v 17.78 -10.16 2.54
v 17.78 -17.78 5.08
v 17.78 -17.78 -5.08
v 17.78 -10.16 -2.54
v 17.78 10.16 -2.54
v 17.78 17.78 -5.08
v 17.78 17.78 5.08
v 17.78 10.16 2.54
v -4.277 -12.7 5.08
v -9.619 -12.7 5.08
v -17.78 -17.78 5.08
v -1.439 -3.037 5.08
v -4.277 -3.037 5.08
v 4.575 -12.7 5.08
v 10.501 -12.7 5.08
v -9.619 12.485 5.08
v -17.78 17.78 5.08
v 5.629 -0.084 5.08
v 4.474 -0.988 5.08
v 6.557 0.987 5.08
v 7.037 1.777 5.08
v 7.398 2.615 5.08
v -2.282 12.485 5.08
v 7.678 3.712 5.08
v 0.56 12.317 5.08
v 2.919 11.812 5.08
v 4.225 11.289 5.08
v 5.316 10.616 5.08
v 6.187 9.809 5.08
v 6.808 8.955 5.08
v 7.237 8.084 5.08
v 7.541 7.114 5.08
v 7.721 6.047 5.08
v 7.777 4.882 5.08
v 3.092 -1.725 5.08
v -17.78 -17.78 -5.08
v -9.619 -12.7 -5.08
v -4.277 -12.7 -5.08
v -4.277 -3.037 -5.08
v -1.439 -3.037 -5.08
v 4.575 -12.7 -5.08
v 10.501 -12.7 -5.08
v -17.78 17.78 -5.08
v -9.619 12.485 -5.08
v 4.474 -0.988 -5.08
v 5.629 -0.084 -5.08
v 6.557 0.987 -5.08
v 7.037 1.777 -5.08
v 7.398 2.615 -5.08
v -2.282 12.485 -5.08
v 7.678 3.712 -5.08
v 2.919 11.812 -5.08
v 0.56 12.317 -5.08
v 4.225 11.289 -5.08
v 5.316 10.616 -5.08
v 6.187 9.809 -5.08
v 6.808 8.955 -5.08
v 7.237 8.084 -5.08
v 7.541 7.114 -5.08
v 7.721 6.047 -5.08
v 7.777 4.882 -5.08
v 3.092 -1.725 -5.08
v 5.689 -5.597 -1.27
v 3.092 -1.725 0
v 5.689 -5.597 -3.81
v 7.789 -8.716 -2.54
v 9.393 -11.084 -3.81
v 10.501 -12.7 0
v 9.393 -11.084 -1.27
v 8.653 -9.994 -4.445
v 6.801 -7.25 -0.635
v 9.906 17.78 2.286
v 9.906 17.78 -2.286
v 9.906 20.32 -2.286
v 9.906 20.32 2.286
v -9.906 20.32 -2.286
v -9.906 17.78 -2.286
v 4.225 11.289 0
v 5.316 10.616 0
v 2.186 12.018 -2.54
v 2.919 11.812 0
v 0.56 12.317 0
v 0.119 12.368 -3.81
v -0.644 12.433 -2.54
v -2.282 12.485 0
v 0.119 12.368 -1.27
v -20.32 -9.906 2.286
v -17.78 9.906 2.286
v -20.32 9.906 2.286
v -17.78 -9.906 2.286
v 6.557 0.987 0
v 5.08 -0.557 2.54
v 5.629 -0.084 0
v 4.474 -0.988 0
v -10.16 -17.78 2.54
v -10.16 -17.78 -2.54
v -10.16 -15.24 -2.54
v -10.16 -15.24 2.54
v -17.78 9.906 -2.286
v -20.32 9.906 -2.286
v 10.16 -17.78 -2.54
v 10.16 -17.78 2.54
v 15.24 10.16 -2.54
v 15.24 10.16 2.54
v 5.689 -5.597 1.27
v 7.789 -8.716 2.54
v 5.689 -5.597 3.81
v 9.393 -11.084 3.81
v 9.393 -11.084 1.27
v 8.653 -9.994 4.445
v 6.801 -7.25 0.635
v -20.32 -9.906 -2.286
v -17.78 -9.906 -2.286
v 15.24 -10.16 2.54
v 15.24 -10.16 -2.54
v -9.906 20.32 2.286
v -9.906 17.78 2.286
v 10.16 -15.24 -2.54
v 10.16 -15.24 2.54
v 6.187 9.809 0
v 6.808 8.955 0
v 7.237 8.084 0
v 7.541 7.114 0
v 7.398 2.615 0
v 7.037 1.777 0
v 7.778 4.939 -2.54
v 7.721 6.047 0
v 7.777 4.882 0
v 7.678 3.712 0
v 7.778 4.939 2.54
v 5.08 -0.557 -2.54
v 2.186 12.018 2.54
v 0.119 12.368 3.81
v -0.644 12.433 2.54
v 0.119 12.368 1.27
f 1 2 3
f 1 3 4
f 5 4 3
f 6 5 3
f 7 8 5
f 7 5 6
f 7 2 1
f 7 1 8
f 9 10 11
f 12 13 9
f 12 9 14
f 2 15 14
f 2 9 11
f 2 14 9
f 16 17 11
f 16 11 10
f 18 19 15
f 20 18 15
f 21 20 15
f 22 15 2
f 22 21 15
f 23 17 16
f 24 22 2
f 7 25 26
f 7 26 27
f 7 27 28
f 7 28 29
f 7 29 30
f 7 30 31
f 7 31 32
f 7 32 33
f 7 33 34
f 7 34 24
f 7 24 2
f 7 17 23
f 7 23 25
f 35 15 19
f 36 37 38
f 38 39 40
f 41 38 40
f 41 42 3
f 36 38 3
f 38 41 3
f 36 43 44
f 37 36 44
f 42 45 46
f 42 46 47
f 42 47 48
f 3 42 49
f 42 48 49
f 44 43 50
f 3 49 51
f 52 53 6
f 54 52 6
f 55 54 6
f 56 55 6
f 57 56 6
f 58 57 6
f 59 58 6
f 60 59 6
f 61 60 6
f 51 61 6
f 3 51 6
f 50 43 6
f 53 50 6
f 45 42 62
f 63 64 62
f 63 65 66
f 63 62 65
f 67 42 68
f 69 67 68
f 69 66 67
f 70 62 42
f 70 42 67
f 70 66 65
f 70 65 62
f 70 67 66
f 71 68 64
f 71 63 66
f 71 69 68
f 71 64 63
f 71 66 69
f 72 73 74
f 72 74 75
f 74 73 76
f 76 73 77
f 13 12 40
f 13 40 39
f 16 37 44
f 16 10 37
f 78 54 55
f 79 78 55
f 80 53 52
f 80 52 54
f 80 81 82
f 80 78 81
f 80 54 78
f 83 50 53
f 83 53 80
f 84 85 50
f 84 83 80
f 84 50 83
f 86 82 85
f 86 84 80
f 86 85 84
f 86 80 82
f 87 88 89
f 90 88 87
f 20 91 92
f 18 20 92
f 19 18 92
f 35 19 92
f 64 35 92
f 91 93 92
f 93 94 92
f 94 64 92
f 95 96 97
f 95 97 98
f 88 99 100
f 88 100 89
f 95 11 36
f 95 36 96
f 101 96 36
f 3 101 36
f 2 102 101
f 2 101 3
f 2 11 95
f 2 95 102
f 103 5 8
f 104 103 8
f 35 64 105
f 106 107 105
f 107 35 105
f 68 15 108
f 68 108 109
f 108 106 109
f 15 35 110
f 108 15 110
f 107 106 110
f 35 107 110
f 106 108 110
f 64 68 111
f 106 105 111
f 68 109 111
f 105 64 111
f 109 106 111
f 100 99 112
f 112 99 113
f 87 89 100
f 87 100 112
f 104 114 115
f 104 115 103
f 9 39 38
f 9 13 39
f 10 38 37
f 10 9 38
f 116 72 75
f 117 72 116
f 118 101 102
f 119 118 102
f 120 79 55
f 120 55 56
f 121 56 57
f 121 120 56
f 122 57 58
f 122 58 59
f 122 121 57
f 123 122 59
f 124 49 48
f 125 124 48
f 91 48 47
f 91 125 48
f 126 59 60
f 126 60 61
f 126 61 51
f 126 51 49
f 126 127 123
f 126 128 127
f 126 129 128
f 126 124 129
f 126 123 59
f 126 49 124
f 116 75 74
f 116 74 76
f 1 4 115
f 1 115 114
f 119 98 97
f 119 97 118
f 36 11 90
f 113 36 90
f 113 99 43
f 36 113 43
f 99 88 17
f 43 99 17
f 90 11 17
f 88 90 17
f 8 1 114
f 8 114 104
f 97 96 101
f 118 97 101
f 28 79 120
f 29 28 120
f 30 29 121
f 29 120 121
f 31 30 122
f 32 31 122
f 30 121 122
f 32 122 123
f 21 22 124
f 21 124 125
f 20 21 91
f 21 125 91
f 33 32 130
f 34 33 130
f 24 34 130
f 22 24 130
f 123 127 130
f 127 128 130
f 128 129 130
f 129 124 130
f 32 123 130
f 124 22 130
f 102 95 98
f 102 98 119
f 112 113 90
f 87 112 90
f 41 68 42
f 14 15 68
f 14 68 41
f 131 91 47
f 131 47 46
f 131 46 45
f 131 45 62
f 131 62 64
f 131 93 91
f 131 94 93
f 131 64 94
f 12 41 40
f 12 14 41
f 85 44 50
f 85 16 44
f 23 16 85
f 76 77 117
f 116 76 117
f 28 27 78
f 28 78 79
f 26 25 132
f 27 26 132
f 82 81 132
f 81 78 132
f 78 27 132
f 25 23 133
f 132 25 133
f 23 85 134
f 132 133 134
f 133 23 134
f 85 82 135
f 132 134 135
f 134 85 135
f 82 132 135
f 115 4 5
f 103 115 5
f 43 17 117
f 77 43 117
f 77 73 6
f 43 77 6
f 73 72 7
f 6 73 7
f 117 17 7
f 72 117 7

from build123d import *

# Parameters (mm, degrees)
F0_W     = 35.56
F0_H     = 35.56
F1_DEPTH = 5.08
F2_W     = 19.812
F2_H     = 4.572
F3_DEPTH = 2.54
F4_W     = 19.812
F4_H     = 4.572
F5_DEPTH = 2.54
F6_W     = 20.32
F6_H     = 5.08
F7_DEPTH = 2.54
F8_W     = 20.32
F8_H     = 5.08
F9_DEPTH = 2.54


with BuildPart() as f1:
    # F0 (on Top) → F1 (new body, symmetric)
    with BuildSketch(Plane.XY):
        Rectangle(F0_W, F0_H)
        with BuildLine():
            Line((-1.438671875, -3.0371961806), (-4.2774305556, -3.0371961806))
            Line((-4.2774305556, -3.0371961806), (-4.2774305556, -12.7))
            Line((-4.2774305556, -12.7), (-9.6187065972, -12.7))
            Line((-9.6187065972, -12.7), (-9.6187065972, 12.4850260417))
            Line((-9.6187065972, 12.4850260417), (-2.28203125, 12.4850260417))
            add(Edge.make_bspline(
                [(-2.28203125, 12.4850260417), (2.8552951389, 12.4850260417), (5.3164713542, 10.61640625)],
                knots=[0, 0, 0, 1, 1, 1], degree=2))
            add(Edge.make_bspline(
                [(5.3164713542, 10.61640625), (7.7776475694, 8.7477864583), (7.7776475694, 4.9388888889)],
                knots=[0, 0, 0, 1, 1, 1], degree=2))
            add(Edge.make_bspline(
                [(7.7776475694, 4.9388888889), (7.7776475694, 2.7174913194), (6.5567057292, 0.9866753472)],
                knots=[0, 0, 0, 1, 1, 1], degree=2))
            add(Edge.make_bspline(
                [(6.5567057292, 0.9866753472), (5.3357638889, -0.744140625), (3.0923177083, -1.7253038194)],
                knots=[0, 0, 0, 1, 1, 1], degree=2))
            add(Edge.make_bspline(
                [(3.0923177083, -1.7253038194), (8.780859375, -10.21953125), (10.5006510417, -12.7)],
                knots=[0, 0, 0, 1, 1, 1], degree=2))
            Line((10.5006510417, -12.7), (4.5750868056, -12.7))
            Line((4.5750868056, -12.7), (-1.438671875, -3.0371961806))
        make_face(mode=Mode.SUBTRACT)
    extrude(amount=F1_DEPTH, both=True)

    # F2 (on face) → F3 (join)
    with BuildSketch(Plane(origin=(0, 17.78, 0), x_dir=(-1, 0, 0), z_dir=(0, 1, 0))):
        Rectangle(F2_W, F2_H)
    extrude(amount=F3_DEPTH)

    # F4 (on face) → F5 (join)
    with BuildSketch(Plane(origin=(-17.78, 0, 0), x_dir=(0, -1, 0), z_dir=(-1, 0, 0))):
        Rectangle(F4_W, F4_H)
    extrude(amount=F5_DEPTH)

    # F6 (on face) → F7 (cut)
    with BuildSketch(Plane.XZ.offset(17.78)):
        Rectangle(F6_W, F6_H)
    extrude(amount=-F7_DEPTH, mode=Mode.SUBTRACT)

    # F8 (on face) → F9 (cut)
    with BuildSketch(Plane.YZ.offset(17.78)):
        Rectangle(F8_W, F8_H)
    extrude(amount=-F9_DEPTH, mode=Mode.SUBTRACT)


solid = f1.part
